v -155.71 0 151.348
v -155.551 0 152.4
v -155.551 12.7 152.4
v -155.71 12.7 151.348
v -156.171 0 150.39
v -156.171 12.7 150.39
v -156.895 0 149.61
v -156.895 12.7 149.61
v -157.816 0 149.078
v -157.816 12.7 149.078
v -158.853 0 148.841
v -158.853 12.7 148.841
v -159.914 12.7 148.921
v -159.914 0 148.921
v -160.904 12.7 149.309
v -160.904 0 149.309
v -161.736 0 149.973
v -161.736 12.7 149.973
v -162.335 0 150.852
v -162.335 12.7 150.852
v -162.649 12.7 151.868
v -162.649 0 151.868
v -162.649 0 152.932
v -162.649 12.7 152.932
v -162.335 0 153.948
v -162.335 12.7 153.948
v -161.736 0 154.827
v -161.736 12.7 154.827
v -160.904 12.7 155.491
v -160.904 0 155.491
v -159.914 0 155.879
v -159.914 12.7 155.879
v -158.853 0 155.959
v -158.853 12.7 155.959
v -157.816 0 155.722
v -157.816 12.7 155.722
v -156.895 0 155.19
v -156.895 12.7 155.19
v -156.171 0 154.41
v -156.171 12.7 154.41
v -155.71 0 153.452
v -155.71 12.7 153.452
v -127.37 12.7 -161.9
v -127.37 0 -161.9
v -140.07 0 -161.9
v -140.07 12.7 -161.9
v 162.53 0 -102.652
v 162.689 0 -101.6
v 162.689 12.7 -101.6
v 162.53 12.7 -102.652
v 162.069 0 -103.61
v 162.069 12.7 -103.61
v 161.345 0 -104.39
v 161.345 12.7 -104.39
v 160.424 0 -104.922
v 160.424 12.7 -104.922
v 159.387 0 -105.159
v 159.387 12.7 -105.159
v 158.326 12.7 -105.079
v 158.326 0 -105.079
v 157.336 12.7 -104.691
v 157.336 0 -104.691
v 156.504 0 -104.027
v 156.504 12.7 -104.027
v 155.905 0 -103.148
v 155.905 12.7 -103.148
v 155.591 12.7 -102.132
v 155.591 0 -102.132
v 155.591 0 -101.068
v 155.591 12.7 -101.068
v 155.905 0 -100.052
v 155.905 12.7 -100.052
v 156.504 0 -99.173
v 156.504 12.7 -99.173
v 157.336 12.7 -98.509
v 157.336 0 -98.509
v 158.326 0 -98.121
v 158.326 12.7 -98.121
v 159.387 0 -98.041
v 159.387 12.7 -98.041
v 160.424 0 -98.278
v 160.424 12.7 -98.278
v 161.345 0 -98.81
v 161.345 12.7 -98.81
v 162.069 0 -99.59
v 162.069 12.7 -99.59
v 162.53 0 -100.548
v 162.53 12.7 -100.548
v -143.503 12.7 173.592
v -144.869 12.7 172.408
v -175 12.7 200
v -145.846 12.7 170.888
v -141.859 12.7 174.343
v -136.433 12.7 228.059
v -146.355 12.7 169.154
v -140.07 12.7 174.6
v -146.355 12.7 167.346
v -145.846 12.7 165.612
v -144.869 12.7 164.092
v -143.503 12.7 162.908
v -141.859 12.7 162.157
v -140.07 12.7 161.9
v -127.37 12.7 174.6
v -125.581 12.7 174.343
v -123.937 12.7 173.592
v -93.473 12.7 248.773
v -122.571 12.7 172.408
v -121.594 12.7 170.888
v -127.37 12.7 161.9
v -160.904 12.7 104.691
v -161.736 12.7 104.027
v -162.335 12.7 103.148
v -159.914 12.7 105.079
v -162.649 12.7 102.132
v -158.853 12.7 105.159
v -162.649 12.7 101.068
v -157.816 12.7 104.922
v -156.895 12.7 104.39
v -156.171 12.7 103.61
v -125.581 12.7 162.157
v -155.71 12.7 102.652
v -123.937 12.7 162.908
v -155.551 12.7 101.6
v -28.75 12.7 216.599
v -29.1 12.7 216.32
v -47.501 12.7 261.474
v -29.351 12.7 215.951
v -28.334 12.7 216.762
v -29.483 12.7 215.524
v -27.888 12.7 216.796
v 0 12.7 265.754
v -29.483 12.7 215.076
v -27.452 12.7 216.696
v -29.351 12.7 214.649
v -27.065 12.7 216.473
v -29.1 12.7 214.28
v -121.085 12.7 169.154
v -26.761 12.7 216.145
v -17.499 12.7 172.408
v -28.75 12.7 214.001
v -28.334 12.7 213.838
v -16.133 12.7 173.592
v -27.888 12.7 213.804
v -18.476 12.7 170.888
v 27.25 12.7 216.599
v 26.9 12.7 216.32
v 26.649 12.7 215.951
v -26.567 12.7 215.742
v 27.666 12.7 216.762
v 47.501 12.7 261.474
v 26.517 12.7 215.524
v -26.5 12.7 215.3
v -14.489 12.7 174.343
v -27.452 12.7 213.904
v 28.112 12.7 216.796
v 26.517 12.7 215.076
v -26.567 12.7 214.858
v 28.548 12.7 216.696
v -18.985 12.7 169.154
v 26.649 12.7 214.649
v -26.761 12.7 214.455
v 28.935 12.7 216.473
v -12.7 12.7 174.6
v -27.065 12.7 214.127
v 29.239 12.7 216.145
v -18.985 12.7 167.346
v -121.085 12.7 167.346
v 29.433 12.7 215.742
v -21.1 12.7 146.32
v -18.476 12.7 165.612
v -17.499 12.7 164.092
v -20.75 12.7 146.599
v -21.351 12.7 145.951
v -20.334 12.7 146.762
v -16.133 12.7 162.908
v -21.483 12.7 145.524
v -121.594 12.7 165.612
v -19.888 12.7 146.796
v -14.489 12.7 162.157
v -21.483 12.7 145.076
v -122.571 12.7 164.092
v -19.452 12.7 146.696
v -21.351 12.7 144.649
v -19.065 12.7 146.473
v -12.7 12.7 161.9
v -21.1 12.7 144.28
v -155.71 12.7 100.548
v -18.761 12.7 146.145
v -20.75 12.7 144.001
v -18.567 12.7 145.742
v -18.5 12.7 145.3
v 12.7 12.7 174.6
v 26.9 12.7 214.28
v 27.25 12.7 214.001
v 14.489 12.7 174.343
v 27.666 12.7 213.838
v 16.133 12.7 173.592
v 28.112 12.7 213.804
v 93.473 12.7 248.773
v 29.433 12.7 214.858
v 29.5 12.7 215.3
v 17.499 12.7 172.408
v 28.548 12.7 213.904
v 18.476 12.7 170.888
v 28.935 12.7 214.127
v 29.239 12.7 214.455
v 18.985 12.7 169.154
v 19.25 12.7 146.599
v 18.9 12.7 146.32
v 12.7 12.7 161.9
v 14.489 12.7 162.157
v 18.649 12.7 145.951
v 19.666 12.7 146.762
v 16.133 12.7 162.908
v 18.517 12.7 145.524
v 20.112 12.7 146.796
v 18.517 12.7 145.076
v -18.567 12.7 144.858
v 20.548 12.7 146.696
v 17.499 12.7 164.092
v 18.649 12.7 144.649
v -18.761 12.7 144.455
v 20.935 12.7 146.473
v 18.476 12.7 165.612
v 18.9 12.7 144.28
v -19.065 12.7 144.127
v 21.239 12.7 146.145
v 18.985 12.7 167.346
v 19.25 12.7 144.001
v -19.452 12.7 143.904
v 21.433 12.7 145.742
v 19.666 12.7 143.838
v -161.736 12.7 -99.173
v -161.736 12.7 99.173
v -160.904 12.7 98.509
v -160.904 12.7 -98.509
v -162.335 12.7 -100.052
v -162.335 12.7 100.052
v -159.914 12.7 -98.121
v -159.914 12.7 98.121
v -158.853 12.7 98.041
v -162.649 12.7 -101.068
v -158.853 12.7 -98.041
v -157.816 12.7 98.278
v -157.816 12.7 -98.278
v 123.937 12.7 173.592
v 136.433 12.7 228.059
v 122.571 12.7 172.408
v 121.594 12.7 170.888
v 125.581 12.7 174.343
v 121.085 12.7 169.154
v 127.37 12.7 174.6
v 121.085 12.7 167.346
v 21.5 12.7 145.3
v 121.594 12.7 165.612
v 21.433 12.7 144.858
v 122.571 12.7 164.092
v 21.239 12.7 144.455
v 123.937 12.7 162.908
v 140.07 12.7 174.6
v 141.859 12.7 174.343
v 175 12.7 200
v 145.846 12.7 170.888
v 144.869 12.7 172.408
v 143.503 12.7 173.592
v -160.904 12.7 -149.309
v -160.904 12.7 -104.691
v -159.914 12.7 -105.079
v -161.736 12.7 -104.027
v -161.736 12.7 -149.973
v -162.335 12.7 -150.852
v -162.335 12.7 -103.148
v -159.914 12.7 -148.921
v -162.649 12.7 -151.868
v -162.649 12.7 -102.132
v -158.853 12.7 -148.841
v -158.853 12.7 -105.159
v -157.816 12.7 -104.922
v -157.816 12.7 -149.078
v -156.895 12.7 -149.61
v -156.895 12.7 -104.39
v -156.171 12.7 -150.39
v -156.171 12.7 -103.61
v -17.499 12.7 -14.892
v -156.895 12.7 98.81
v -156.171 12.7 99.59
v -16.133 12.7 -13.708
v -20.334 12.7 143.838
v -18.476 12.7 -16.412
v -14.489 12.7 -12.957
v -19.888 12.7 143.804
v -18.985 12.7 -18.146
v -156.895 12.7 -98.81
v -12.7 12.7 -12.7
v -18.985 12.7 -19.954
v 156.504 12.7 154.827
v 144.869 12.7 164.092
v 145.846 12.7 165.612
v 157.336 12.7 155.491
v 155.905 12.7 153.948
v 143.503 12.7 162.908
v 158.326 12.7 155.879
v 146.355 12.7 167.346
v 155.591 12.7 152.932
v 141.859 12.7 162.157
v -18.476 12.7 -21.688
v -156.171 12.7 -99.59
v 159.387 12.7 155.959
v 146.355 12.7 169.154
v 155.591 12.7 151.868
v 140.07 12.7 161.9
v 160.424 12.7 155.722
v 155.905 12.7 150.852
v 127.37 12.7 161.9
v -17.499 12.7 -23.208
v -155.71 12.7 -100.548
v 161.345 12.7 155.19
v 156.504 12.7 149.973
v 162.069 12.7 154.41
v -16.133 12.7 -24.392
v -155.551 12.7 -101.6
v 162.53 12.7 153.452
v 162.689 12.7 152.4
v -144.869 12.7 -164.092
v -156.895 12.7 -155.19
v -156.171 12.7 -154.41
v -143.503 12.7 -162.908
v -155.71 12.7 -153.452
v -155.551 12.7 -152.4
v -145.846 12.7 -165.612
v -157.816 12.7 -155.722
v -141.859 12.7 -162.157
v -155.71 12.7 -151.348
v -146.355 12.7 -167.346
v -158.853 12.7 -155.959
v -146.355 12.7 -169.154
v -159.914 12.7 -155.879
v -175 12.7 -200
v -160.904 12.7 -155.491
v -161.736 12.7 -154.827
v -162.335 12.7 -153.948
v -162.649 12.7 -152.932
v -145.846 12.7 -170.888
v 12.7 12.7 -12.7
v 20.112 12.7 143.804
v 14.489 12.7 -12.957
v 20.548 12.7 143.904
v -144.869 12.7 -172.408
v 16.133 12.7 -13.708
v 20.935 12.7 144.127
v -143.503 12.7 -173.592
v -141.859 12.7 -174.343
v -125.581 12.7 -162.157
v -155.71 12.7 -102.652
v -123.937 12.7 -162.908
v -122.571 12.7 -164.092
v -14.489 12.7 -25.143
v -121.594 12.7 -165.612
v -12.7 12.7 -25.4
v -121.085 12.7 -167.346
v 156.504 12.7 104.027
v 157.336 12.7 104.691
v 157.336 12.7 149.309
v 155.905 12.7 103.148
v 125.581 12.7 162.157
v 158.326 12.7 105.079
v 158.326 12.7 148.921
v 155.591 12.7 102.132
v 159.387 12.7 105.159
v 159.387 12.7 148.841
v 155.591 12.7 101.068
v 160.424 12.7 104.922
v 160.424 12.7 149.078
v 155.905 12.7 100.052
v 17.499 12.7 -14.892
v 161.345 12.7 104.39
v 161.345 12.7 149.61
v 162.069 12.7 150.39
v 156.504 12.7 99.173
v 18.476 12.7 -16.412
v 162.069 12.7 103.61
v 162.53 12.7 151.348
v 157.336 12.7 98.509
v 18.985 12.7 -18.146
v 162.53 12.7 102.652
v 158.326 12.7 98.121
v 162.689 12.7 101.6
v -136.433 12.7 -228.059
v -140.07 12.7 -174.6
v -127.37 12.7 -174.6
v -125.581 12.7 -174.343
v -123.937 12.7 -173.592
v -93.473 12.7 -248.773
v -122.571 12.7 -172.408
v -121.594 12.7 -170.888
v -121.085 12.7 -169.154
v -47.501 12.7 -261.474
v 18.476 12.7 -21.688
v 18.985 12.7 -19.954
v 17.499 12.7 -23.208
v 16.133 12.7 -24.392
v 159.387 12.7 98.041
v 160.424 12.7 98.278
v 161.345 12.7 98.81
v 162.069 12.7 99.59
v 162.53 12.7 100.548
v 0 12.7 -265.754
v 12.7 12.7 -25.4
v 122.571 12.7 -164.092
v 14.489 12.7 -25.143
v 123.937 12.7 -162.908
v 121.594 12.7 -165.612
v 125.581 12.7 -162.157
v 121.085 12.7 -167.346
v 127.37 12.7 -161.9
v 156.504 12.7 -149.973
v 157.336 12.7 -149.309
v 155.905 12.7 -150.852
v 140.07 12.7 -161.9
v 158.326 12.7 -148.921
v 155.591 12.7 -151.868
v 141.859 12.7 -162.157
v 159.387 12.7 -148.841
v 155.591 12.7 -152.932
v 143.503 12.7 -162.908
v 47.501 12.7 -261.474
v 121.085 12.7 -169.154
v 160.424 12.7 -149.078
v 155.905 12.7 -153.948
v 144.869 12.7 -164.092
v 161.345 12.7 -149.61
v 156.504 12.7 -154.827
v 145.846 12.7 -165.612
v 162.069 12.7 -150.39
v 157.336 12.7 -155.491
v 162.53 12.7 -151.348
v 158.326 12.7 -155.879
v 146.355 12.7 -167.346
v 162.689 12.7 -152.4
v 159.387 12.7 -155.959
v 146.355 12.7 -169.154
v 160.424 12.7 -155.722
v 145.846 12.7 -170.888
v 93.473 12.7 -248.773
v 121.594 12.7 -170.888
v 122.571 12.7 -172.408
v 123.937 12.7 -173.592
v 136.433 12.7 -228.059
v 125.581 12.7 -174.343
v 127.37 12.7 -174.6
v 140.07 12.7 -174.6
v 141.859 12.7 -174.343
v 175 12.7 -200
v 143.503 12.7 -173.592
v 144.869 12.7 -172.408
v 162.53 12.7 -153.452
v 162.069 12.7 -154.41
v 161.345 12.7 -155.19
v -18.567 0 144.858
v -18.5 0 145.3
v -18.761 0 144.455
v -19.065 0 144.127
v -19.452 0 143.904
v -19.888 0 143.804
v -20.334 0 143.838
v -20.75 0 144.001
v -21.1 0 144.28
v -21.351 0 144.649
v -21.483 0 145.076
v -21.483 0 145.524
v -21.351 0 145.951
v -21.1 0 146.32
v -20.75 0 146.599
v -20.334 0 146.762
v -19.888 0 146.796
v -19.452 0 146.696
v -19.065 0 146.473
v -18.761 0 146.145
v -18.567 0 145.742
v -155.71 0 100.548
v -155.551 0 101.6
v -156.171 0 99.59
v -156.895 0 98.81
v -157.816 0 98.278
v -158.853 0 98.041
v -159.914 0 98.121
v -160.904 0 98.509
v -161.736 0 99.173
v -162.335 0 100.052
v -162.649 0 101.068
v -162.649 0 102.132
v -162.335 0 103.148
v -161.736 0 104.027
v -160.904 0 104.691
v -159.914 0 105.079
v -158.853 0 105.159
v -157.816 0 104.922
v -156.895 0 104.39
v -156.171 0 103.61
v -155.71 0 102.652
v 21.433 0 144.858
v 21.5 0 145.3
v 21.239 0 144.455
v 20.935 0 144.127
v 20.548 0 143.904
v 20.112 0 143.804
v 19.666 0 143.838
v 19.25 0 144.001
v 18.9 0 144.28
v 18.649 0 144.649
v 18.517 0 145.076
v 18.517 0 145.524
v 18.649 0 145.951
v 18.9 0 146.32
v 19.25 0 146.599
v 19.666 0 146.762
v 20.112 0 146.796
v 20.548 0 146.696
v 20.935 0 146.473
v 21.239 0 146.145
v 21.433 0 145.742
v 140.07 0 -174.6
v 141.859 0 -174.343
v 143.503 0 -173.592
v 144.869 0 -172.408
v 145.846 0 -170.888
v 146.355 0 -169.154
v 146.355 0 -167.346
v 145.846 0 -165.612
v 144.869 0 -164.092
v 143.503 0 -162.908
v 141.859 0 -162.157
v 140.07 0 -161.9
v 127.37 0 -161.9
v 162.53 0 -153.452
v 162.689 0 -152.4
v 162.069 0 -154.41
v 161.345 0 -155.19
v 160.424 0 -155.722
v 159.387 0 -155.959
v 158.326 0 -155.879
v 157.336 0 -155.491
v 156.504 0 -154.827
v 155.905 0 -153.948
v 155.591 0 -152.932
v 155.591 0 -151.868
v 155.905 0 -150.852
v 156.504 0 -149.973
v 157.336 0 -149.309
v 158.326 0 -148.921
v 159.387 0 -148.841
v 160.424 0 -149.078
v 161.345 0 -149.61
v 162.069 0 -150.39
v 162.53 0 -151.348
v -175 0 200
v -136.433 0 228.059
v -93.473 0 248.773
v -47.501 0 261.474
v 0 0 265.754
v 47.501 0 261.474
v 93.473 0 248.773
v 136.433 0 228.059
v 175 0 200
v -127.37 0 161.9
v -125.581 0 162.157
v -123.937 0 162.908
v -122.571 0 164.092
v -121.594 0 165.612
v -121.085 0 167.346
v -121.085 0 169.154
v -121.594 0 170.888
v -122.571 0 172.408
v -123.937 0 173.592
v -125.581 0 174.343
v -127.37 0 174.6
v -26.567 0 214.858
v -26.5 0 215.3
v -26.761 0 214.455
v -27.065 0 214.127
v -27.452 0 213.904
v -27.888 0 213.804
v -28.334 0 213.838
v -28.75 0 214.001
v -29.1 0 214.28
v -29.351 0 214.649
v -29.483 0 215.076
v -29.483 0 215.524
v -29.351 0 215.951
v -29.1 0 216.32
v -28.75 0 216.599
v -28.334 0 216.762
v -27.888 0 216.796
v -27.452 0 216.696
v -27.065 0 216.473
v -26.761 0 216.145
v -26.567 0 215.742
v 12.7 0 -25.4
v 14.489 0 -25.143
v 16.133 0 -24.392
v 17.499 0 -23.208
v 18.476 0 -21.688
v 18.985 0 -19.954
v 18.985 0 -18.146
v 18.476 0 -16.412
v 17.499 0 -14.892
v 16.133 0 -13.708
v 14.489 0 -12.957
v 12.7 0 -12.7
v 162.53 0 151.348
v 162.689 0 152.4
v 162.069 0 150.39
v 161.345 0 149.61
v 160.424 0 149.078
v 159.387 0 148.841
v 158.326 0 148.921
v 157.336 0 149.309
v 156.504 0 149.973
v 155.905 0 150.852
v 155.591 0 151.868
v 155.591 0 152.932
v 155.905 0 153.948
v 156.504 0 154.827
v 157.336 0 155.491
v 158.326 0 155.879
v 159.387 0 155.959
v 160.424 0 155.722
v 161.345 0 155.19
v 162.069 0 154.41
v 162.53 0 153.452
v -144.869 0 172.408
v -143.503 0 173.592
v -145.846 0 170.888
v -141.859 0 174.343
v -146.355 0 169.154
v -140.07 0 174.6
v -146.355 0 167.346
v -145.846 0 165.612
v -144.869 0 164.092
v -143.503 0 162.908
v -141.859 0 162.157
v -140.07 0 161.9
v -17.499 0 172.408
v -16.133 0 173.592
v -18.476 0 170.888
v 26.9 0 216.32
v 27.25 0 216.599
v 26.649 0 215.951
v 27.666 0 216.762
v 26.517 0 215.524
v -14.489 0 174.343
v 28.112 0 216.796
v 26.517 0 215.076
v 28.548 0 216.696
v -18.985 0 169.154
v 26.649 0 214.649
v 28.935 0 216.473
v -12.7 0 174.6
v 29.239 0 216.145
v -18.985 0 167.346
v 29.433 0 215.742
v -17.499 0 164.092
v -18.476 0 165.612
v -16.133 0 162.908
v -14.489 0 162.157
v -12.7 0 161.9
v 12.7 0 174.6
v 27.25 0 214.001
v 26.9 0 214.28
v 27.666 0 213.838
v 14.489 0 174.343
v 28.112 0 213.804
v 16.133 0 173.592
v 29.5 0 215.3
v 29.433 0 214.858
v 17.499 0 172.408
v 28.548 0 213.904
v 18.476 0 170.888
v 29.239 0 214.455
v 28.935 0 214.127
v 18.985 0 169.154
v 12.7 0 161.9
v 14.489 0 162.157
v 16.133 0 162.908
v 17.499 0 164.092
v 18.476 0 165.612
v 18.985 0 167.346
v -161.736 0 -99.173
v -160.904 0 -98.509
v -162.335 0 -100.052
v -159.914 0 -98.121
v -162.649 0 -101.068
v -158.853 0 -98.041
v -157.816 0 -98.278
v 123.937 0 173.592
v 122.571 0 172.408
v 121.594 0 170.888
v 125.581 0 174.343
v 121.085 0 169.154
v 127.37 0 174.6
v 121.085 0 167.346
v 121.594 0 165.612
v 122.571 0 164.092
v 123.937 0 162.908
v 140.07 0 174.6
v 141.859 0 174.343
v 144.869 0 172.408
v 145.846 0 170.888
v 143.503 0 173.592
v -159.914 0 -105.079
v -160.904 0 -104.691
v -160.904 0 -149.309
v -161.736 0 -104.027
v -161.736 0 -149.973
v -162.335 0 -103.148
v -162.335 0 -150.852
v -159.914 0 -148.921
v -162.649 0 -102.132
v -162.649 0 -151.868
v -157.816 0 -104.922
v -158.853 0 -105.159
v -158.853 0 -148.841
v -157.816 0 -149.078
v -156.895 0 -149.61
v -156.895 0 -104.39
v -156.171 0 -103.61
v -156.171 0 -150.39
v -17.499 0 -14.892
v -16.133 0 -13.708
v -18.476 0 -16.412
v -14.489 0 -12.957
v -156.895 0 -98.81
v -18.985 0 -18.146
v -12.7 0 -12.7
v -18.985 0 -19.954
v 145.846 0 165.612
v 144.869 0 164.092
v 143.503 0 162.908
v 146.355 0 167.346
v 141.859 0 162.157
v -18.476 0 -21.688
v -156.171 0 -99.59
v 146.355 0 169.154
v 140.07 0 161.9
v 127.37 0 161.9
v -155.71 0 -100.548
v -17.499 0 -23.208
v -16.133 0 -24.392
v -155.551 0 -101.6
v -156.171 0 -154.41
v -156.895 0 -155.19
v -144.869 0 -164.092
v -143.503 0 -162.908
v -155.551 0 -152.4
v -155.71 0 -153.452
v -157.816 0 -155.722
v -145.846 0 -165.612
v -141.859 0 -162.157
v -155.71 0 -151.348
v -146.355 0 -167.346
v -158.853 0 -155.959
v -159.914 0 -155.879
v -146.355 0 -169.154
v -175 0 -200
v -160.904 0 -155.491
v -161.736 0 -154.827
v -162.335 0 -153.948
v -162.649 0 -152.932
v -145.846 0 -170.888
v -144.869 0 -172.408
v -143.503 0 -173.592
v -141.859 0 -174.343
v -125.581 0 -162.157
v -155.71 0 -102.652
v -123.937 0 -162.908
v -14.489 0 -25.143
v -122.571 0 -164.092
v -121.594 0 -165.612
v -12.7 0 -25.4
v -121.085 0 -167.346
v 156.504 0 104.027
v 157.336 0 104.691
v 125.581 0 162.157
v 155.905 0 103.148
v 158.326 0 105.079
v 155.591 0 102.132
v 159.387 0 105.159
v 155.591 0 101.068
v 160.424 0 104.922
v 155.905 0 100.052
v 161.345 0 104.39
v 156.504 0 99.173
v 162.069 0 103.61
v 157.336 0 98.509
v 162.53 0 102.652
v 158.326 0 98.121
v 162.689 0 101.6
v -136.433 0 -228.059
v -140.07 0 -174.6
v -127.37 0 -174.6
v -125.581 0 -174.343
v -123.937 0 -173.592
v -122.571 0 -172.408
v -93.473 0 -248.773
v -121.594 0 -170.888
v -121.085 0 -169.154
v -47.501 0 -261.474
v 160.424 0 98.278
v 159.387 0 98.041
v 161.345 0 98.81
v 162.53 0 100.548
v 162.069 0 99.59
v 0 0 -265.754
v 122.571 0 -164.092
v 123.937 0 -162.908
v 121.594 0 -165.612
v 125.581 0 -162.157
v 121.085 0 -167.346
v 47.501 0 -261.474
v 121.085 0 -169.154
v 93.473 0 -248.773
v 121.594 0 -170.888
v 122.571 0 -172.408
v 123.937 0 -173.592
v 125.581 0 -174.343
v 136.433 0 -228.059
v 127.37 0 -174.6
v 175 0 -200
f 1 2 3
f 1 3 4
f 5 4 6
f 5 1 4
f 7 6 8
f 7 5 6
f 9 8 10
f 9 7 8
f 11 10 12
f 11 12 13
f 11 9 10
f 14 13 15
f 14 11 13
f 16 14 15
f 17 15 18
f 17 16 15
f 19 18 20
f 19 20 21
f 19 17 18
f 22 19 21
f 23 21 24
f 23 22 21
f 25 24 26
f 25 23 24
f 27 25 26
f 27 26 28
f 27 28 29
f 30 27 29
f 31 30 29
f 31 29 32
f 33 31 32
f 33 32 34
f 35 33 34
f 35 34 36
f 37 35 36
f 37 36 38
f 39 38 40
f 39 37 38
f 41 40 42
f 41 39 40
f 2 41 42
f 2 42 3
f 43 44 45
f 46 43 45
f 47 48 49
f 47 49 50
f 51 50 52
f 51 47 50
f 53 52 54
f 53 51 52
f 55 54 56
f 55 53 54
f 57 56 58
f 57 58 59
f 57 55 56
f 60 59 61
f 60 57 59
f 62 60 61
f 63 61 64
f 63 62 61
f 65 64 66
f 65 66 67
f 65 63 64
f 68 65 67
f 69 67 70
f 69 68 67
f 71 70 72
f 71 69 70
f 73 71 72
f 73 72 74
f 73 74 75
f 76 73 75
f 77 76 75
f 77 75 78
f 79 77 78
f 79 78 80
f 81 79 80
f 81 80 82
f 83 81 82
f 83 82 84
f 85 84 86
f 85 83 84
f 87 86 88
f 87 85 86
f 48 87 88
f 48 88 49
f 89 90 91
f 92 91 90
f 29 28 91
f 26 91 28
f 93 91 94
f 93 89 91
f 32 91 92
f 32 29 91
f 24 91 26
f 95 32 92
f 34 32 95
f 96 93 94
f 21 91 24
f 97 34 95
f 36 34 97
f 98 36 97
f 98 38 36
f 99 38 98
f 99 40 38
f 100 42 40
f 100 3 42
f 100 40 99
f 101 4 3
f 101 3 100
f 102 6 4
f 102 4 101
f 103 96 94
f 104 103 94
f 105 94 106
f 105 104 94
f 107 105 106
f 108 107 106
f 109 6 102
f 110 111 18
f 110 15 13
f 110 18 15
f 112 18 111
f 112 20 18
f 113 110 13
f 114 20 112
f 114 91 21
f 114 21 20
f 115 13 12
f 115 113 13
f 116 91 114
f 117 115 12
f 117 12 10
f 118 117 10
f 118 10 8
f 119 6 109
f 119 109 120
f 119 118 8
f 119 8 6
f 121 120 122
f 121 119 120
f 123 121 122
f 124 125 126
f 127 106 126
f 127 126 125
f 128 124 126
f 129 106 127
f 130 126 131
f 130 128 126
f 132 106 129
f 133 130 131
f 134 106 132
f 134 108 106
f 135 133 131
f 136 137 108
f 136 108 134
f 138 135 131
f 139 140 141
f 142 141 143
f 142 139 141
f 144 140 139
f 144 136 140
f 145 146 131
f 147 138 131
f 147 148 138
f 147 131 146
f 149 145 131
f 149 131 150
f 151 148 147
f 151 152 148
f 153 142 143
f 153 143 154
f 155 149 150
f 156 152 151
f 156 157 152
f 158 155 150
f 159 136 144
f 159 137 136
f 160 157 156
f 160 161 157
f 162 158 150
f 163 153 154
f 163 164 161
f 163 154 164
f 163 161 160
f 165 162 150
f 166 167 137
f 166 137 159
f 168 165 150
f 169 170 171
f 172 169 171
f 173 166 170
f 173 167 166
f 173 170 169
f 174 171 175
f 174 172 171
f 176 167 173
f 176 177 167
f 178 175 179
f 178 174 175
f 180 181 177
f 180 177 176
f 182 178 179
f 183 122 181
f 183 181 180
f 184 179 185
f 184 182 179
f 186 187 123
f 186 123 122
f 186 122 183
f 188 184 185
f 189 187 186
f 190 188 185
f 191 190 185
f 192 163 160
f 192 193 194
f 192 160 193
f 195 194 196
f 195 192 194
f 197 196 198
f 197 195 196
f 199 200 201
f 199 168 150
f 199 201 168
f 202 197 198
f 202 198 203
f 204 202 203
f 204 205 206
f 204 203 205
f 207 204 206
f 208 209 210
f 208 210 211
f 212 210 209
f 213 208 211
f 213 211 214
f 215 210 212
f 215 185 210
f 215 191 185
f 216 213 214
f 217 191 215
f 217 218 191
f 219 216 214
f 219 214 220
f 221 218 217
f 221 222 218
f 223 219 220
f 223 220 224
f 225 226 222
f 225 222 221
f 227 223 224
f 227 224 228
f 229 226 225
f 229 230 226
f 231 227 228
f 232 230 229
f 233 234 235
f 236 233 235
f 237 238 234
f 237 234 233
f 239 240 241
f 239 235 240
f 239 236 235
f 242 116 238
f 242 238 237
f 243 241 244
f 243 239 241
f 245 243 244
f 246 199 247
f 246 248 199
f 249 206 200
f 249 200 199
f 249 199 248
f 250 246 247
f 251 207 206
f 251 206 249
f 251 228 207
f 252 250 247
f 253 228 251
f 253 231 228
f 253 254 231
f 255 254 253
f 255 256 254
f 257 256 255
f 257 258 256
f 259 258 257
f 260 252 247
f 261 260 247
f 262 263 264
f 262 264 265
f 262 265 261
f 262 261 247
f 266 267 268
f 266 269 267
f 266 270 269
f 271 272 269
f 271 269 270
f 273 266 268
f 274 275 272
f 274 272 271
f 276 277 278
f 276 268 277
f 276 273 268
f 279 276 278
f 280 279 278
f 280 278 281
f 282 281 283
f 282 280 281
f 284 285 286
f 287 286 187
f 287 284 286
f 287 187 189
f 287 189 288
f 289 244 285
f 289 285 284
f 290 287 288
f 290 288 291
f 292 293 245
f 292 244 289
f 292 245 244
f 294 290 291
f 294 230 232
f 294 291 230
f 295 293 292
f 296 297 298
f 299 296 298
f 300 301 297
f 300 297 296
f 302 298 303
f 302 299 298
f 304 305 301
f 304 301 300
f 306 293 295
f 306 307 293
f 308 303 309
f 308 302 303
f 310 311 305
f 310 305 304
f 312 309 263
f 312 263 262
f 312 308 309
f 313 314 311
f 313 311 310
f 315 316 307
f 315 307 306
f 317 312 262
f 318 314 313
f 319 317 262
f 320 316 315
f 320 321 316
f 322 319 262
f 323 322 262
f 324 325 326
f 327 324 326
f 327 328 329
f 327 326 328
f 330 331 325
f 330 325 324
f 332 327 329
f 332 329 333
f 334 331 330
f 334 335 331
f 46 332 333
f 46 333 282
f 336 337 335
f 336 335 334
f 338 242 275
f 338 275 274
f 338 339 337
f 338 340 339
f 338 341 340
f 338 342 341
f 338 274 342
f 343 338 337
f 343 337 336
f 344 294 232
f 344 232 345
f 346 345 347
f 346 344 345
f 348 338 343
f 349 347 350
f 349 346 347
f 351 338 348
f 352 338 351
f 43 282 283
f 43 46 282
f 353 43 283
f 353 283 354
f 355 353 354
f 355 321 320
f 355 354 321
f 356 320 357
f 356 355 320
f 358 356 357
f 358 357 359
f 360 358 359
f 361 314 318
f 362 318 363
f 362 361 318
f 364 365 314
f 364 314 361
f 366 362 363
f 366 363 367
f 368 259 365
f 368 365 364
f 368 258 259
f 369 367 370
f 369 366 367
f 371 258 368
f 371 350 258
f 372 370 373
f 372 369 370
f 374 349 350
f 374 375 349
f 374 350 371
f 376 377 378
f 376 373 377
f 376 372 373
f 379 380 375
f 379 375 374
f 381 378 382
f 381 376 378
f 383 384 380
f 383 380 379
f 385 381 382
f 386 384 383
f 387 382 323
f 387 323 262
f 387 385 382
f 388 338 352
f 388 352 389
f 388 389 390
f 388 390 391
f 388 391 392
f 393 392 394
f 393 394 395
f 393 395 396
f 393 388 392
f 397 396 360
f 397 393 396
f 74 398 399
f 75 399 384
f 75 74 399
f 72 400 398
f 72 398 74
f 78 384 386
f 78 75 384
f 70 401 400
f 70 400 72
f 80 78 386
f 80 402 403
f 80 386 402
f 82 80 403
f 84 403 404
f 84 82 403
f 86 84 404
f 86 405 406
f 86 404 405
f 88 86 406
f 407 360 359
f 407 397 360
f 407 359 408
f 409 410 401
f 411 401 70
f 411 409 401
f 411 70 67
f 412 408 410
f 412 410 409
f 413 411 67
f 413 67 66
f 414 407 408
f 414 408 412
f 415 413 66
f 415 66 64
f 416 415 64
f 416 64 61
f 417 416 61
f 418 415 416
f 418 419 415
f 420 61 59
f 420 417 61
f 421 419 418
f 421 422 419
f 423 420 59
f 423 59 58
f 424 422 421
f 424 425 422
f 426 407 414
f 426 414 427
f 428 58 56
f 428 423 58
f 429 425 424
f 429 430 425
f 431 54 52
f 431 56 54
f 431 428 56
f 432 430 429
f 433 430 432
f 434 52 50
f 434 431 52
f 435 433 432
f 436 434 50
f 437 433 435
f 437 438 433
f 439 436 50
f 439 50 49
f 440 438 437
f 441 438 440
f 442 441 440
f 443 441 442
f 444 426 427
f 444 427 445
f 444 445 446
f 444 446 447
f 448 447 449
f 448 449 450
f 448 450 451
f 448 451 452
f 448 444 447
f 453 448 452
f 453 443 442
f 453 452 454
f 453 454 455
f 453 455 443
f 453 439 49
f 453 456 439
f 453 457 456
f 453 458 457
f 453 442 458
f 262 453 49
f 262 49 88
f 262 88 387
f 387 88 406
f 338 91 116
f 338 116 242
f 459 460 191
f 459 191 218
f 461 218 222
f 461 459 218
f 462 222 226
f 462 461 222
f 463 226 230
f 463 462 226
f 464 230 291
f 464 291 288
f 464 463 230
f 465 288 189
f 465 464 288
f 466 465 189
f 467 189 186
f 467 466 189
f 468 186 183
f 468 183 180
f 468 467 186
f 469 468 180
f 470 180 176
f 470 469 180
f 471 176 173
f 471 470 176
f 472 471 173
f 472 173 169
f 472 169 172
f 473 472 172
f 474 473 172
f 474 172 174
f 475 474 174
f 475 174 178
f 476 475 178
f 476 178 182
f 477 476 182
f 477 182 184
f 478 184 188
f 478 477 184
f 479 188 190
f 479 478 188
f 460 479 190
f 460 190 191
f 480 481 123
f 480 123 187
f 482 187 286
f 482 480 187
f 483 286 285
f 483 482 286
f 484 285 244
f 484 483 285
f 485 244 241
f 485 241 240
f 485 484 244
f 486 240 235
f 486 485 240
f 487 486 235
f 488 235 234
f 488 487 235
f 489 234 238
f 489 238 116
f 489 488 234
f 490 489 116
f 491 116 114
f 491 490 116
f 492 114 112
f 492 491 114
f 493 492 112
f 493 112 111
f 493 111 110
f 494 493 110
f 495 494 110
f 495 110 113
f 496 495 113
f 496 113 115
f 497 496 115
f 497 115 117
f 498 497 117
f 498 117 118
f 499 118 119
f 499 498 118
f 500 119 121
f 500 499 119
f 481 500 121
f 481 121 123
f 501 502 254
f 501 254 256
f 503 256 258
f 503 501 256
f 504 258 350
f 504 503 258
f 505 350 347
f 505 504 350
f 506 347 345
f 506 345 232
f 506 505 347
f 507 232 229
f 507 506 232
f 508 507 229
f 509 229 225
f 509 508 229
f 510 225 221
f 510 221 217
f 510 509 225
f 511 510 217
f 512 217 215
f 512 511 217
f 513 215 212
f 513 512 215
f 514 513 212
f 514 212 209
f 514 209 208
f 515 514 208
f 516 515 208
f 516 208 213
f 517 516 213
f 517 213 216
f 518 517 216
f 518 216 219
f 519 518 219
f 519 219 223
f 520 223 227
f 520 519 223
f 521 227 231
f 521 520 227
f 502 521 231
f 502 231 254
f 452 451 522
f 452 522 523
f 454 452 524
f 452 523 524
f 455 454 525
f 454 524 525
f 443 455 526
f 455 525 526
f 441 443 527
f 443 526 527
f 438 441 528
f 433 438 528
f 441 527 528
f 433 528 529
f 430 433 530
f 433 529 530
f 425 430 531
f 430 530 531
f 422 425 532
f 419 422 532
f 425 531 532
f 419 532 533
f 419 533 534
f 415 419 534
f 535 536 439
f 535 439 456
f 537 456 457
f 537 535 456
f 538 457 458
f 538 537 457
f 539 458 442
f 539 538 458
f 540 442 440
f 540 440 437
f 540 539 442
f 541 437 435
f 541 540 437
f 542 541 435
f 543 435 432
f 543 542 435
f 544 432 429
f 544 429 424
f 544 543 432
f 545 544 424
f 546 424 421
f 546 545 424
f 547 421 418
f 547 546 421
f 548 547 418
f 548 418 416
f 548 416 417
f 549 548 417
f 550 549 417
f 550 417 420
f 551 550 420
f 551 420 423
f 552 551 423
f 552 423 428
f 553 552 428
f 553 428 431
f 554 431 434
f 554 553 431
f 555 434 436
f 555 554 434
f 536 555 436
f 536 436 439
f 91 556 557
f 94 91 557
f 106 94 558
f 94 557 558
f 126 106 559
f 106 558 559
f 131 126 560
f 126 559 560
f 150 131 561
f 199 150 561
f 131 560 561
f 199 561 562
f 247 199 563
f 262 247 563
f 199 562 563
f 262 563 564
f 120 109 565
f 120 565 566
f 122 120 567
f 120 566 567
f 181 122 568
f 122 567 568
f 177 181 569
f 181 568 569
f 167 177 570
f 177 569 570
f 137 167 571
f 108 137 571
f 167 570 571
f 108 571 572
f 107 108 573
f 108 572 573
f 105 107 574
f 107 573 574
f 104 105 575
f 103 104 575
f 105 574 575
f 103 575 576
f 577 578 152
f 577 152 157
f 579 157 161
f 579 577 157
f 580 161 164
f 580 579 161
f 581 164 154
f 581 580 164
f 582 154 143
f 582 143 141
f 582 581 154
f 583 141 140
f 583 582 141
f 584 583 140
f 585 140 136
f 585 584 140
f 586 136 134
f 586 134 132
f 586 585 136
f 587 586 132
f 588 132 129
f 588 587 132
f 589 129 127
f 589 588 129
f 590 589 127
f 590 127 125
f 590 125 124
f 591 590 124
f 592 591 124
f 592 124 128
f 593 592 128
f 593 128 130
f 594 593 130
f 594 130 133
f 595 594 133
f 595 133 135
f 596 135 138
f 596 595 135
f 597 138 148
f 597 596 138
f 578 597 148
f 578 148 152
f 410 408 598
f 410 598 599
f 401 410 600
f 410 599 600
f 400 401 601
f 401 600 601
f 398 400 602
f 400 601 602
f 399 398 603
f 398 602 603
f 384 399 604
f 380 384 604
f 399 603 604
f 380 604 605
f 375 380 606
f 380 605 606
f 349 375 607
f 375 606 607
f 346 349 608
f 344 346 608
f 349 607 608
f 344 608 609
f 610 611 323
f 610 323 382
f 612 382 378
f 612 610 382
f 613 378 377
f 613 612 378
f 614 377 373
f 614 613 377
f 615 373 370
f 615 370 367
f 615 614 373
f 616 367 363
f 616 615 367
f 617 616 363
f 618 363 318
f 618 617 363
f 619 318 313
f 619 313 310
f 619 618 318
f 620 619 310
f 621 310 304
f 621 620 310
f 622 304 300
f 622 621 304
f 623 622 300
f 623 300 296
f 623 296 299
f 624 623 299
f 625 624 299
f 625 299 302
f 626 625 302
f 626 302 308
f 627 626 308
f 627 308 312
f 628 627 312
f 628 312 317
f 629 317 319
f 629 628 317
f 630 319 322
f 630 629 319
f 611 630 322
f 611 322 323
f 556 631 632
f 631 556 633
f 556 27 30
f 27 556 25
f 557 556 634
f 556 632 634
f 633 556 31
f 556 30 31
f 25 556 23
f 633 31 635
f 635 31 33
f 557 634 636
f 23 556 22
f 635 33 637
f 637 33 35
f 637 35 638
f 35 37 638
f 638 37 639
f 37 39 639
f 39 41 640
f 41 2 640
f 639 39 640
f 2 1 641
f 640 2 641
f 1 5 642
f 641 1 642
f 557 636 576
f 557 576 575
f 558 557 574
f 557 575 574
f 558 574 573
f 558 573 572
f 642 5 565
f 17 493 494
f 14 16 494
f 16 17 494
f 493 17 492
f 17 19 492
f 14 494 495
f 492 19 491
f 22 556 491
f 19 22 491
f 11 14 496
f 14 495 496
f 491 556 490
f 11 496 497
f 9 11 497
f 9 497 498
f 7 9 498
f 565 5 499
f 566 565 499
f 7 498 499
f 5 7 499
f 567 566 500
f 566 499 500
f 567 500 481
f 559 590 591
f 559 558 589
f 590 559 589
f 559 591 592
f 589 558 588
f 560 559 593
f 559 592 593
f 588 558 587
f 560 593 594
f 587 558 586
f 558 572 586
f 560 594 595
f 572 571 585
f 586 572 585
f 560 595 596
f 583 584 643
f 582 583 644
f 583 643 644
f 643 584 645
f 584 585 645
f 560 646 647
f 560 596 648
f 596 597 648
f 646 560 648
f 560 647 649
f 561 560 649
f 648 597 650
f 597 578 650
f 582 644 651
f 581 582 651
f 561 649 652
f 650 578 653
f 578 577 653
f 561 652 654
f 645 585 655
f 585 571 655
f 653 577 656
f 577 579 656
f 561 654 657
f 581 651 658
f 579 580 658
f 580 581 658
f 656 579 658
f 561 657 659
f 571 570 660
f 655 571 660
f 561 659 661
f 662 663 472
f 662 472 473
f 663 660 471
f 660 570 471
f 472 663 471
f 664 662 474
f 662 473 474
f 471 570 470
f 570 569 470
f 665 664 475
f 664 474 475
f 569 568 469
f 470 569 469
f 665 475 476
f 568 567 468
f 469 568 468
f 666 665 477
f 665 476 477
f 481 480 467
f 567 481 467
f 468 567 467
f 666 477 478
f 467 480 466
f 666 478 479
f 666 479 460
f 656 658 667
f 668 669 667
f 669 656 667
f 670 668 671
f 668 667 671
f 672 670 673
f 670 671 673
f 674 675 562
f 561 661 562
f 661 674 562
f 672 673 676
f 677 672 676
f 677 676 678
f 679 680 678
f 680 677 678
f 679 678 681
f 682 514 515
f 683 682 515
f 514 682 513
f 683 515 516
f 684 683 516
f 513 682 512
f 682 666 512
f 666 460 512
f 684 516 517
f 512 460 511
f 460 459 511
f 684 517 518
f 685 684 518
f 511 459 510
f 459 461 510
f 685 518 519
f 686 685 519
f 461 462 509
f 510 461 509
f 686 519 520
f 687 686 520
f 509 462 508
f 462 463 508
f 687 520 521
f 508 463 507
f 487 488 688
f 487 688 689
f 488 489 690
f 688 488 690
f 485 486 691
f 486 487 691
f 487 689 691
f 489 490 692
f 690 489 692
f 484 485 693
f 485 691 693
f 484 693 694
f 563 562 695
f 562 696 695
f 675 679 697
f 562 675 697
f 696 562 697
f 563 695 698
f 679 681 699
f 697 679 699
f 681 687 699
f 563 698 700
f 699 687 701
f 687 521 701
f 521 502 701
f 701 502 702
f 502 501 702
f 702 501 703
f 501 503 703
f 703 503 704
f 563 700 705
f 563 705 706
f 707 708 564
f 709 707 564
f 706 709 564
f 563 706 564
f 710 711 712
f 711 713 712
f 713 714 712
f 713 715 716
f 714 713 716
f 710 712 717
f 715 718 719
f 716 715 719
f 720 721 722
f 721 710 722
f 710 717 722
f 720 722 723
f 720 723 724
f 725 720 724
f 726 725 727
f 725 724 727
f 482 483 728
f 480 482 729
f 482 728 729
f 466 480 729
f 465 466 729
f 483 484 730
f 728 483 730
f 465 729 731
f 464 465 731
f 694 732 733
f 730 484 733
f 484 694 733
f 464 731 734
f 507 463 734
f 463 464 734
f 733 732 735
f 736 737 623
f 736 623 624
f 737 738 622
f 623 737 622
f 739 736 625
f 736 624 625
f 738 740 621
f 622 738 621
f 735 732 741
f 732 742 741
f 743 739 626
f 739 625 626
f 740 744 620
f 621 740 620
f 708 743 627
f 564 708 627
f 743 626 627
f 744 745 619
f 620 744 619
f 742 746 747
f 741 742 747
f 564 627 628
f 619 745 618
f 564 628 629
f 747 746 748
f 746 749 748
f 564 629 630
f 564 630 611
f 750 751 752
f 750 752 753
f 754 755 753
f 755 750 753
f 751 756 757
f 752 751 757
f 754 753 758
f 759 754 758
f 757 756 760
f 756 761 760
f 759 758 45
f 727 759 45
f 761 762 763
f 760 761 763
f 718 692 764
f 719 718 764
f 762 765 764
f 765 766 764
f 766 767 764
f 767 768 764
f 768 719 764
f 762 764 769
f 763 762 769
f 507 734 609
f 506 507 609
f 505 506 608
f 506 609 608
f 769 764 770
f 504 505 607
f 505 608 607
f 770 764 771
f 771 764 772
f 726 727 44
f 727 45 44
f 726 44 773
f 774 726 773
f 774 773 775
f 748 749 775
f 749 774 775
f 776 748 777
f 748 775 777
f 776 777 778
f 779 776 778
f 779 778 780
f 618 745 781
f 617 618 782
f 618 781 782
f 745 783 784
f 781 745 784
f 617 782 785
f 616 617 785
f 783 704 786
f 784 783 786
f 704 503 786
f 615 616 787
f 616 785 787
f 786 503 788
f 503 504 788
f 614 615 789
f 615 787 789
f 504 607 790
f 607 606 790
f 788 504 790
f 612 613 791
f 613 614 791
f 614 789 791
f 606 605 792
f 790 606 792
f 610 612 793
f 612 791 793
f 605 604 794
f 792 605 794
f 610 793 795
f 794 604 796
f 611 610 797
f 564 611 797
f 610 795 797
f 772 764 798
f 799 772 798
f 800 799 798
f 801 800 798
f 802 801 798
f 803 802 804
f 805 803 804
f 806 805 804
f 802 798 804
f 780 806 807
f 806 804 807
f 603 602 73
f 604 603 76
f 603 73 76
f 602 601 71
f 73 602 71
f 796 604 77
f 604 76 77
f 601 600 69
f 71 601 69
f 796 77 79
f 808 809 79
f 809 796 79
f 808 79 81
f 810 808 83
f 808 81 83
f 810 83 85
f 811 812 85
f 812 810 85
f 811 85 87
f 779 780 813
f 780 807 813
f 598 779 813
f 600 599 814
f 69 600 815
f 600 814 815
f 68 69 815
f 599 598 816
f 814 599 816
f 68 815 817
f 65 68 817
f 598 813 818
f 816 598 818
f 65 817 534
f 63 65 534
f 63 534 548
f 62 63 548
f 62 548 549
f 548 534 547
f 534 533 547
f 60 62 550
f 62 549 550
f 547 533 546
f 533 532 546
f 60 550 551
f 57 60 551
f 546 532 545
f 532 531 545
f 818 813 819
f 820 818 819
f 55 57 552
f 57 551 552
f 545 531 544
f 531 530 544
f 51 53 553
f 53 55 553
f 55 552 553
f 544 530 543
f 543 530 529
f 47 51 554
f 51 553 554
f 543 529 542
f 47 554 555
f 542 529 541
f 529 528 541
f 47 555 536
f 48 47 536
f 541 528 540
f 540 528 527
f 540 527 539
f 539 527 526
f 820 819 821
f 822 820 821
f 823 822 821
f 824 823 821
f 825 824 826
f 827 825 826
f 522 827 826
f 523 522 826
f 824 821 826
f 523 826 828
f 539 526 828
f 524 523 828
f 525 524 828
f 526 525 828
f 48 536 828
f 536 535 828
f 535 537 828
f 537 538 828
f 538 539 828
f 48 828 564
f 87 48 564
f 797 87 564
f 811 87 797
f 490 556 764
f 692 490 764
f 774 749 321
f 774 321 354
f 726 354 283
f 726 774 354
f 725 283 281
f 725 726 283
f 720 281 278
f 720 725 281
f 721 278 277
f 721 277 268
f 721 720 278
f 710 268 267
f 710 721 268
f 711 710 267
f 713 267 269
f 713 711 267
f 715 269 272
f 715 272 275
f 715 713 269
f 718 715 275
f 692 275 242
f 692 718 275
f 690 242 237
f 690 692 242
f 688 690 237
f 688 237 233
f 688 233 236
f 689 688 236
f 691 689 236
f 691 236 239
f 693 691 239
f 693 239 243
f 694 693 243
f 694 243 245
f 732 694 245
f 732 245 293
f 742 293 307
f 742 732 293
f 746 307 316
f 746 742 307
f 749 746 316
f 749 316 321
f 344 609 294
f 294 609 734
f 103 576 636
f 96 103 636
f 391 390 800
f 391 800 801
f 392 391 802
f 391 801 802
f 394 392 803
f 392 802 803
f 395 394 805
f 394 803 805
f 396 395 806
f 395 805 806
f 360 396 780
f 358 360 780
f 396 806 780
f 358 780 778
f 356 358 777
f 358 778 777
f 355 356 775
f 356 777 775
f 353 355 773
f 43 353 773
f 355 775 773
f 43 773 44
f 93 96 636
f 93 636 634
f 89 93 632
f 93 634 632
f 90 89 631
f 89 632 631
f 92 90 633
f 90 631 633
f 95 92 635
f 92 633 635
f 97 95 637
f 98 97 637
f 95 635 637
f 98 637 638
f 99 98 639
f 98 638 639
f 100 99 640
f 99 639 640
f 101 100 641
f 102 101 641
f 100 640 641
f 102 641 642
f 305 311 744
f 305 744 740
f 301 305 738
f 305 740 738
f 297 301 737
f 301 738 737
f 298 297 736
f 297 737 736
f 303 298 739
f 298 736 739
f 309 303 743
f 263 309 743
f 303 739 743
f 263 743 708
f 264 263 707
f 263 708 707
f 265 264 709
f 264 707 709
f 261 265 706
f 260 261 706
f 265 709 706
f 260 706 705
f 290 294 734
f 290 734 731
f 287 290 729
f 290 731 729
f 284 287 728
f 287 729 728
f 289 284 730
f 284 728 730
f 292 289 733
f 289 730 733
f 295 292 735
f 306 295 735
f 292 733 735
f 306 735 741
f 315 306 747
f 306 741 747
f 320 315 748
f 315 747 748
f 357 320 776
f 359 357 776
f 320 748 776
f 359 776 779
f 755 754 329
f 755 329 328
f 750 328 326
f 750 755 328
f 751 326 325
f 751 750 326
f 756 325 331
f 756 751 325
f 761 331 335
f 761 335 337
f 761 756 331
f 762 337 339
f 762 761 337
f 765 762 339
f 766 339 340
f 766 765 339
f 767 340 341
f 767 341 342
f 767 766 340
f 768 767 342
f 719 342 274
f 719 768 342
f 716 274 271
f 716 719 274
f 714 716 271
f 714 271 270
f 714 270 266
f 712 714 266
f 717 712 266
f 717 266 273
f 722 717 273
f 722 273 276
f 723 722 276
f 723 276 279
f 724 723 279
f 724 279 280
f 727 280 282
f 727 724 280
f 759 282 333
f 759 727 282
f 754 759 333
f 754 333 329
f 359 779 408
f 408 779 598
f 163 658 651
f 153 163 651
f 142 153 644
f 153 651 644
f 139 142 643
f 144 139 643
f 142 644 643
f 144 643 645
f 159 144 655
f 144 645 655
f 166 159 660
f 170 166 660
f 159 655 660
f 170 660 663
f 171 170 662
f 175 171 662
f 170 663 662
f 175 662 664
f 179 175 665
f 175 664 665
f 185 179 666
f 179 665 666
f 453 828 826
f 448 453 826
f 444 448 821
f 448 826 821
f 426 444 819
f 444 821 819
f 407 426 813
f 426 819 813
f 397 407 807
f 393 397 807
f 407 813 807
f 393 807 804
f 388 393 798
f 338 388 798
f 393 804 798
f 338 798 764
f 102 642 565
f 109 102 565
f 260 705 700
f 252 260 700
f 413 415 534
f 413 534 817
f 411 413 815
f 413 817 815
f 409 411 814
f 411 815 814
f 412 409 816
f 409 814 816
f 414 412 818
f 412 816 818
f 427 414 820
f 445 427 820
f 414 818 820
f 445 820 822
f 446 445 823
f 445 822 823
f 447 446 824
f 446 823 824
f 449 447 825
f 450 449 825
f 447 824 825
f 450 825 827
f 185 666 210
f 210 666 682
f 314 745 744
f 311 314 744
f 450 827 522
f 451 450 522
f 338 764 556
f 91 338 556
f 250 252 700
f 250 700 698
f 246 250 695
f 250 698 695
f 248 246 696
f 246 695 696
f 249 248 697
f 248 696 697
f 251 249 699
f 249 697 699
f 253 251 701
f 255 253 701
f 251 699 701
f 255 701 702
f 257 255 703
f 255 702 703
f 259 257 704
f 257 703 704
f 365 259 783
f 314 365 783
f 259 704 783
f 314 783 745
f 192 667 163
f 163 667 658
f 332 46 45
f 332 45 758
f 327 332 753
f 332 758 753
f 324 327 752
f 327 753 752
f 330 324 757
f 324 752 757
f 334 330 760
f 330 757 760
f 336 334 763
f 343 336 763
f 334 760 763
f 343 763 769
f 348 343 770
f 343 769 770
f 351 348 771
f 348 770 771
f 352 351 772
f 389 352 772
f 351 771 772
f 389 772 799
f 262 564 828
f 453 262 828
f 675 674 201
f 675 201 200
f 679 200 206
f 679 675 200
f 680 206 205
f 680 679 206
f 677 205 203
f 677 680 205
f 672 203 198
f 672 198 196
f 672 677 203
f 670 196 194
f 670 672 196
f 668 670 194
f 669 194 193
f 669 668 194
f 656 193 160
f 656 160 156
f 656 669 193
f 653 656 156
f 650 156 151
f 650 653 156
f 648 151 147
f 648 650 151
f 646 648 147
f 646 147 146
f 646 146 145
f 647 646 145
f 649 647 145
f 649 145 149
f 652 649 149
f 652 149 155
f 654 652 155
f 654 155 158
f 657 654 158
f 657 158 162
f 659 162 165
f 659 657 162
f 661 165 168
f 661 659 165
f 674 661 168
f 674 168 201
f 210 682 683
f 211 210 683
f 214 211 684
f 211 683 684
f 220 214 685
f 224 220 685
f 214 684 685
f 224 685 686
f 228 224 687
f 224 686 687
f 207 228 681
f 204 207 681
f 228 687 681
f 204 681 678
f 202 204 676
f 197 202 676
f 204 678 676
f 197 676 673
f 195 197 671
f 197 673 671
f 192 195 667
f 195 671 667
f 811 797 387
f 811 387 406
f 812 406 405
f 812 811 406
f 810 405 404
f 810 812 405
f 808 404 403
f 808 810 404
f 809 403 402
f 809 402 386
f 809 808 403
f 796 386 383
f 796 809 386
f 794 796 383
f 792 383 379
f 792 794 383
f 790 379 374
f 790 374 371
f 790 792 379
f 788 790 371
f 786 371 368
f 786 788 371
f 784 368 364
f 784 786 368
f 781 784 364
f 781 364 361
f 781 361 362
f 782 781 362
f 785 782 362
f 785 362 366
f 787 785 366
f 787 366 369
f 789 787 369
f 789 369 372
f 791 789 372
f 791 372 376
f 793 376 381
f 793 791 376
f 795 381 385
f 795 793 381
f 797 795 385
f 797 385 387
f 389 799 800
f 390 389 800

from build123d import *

# Parameters (mm, degrees)
SKETCH1_R           = 1.5
SKETCH1_R_2         = 3.5687
BOSS_EXTRUDE1_DEPTH = 12.7


with BuildPart() as part:
    # Sketch1 → Boss-Extrude1 (new body)
    with BuildSketch(Plane(origin=(0, 0, 0), x_dir=(1, 0, 0), z_dir=(0, 1, 0))):
        with BuildLine():
            Line((175, -200), (175, 200))
            ThreePointArc((175, 200), (0, 265.753645318), (-175, 200))
            Line((-175, 200), (-175, -200))
            ThreePointArc((-175, -200), (0, -265.753645318), (175, -200))
        make_face()
        with Locations((20, -145.3)):
            Circle(SKETCH1_R, mode=Mode.SUBTRACT)
        with Locations((-20, -145.3)):
            Circle(SKETCH1_R, mode=Mode.SUBTRACT)
        with Locations((28, -215.3)):
            Circle(SKETCH1_R, mode=Mode.SUBTRACT)
        with Locations((-28, -215.3)):
            Circle(SKETCH1_R, mode=Mode.SUBTRACT)
        with Locations((-159.12, -101.6)):
            Circle(SKETCH1_R_2, mode=Mode.SUBTRACT)
        with Locations((-159.12, -152.4)):
            Circle(SKETCH1_R_2, mode=Mode.SUBTRACT)
        with Locations((-159.12, 152.4)):
            Circle(SKETCH1_R_2, mode=Mode.SUBTRACT)
        with Locations((-159.12, 101.6)):
            Circle(SKETCH1_R_2, mode=Mode.SUBTRACT)
        with Locations((159.12, -152.4)):
            Circle(SKETCH1_R_2, mode=Mode.SUBTRACT)
        with Locations((159.12, -101.6)):
            Circle(SKETCH1_R_2, mode=Mode.SUBTRACT)
        with Locations((159.12, 101.6)):
            Circle(SKETCH1_R_2, mode=Mode.SUBTRACT)
        with Locations((159.12, 152.4)):
            Circle(SKETCH1_R_2, mode=Mode.SUBTRACT)
        with BuildLine():
            Line((-12.7, -161.9), (12.7, -161.9))
            ThreePointArc((12.7, -161.9), (19.05, -168.25), (12.7, -174.6))
            Line((12.7, -174.6), (-12.7, -174.6))
            ThreePointArc((-12.7, -174.6), (-19.05, -168.25), (-12.7, -161.9))
        make_face(mode=Mode.SUBTRACT)
        with BuildLine():
            Line((-140.07, -161.9), (-127.37, -161.9))
            ThreePointArc((-127.37, -161.9), (-121.02, -168.25), (-127.37, -174.6))
            Line((-127.37, -174.6), (-140.07, -174.6))
            ThreePointArc((-140.07, -174.6), (-146.42, -168.25), (-140.07, -161.9))
        make_face(mode=Mode.SUBTRACT)
        with BuildLine():
            Line((127.37, -161.9), (140.07, -161.9))
            ThreePointArc((140.07, -161.9), (146.42, -168.25), (140.07, -174.6))
            Line((140.07, -174.6), (127.37, -174.6))
            ThreePointArc((127.37, -174.6), (121.02, -168.25), (127.37, -161.9))
        make_face(mode=Mode.SUBTRACT)
        with BuildLine():
            Line((-140.07, 174.6), (-127.37, 174.6))
            ThreePointArc((-127.37, 174.6), (-121.02, 168.25), (-127.37, 161.9))
            Line((-127.37, 161.9), (-140.07, 161.9))
            ThreePointArc((-140.07, 161.9), (-146.42, 168.25), (-140.07, 174.6))
        make_face(mode=Mode.SUBTRACT)
        with BuildLine():
            Line((127.37, 174.6), (140.07, 174.6))
            ThreePointArc((140.07, 174.6), (146.42, 168.25), (140.07, 161.9))
            Line((140.07, 161.9), (127.37, 161.9))
            ThreePointArc((127.37, 161.9), (121.02, 168.25), (127.37, 174.6))
        make_face(mode=Mode.SUBTRACT)
        with BuildLine():
            Line((-12.7, 25.4), (12.7, 25.4))
            ThreePointArc((12.7, 25.4), (19.05, 19.05), (12.7, 12.7))
            Line((12.7, 12.7), (-12.7, 12.7))
            ThreePointArc((-12.7, 12.7), (-19.05, 19.05), (-12.7, 25.4))
        make_face(mode=Mode.SUBTRACT)
    extrude(amount=BOSS_EXTRUDE1_DEPTH)


solid = part.part
